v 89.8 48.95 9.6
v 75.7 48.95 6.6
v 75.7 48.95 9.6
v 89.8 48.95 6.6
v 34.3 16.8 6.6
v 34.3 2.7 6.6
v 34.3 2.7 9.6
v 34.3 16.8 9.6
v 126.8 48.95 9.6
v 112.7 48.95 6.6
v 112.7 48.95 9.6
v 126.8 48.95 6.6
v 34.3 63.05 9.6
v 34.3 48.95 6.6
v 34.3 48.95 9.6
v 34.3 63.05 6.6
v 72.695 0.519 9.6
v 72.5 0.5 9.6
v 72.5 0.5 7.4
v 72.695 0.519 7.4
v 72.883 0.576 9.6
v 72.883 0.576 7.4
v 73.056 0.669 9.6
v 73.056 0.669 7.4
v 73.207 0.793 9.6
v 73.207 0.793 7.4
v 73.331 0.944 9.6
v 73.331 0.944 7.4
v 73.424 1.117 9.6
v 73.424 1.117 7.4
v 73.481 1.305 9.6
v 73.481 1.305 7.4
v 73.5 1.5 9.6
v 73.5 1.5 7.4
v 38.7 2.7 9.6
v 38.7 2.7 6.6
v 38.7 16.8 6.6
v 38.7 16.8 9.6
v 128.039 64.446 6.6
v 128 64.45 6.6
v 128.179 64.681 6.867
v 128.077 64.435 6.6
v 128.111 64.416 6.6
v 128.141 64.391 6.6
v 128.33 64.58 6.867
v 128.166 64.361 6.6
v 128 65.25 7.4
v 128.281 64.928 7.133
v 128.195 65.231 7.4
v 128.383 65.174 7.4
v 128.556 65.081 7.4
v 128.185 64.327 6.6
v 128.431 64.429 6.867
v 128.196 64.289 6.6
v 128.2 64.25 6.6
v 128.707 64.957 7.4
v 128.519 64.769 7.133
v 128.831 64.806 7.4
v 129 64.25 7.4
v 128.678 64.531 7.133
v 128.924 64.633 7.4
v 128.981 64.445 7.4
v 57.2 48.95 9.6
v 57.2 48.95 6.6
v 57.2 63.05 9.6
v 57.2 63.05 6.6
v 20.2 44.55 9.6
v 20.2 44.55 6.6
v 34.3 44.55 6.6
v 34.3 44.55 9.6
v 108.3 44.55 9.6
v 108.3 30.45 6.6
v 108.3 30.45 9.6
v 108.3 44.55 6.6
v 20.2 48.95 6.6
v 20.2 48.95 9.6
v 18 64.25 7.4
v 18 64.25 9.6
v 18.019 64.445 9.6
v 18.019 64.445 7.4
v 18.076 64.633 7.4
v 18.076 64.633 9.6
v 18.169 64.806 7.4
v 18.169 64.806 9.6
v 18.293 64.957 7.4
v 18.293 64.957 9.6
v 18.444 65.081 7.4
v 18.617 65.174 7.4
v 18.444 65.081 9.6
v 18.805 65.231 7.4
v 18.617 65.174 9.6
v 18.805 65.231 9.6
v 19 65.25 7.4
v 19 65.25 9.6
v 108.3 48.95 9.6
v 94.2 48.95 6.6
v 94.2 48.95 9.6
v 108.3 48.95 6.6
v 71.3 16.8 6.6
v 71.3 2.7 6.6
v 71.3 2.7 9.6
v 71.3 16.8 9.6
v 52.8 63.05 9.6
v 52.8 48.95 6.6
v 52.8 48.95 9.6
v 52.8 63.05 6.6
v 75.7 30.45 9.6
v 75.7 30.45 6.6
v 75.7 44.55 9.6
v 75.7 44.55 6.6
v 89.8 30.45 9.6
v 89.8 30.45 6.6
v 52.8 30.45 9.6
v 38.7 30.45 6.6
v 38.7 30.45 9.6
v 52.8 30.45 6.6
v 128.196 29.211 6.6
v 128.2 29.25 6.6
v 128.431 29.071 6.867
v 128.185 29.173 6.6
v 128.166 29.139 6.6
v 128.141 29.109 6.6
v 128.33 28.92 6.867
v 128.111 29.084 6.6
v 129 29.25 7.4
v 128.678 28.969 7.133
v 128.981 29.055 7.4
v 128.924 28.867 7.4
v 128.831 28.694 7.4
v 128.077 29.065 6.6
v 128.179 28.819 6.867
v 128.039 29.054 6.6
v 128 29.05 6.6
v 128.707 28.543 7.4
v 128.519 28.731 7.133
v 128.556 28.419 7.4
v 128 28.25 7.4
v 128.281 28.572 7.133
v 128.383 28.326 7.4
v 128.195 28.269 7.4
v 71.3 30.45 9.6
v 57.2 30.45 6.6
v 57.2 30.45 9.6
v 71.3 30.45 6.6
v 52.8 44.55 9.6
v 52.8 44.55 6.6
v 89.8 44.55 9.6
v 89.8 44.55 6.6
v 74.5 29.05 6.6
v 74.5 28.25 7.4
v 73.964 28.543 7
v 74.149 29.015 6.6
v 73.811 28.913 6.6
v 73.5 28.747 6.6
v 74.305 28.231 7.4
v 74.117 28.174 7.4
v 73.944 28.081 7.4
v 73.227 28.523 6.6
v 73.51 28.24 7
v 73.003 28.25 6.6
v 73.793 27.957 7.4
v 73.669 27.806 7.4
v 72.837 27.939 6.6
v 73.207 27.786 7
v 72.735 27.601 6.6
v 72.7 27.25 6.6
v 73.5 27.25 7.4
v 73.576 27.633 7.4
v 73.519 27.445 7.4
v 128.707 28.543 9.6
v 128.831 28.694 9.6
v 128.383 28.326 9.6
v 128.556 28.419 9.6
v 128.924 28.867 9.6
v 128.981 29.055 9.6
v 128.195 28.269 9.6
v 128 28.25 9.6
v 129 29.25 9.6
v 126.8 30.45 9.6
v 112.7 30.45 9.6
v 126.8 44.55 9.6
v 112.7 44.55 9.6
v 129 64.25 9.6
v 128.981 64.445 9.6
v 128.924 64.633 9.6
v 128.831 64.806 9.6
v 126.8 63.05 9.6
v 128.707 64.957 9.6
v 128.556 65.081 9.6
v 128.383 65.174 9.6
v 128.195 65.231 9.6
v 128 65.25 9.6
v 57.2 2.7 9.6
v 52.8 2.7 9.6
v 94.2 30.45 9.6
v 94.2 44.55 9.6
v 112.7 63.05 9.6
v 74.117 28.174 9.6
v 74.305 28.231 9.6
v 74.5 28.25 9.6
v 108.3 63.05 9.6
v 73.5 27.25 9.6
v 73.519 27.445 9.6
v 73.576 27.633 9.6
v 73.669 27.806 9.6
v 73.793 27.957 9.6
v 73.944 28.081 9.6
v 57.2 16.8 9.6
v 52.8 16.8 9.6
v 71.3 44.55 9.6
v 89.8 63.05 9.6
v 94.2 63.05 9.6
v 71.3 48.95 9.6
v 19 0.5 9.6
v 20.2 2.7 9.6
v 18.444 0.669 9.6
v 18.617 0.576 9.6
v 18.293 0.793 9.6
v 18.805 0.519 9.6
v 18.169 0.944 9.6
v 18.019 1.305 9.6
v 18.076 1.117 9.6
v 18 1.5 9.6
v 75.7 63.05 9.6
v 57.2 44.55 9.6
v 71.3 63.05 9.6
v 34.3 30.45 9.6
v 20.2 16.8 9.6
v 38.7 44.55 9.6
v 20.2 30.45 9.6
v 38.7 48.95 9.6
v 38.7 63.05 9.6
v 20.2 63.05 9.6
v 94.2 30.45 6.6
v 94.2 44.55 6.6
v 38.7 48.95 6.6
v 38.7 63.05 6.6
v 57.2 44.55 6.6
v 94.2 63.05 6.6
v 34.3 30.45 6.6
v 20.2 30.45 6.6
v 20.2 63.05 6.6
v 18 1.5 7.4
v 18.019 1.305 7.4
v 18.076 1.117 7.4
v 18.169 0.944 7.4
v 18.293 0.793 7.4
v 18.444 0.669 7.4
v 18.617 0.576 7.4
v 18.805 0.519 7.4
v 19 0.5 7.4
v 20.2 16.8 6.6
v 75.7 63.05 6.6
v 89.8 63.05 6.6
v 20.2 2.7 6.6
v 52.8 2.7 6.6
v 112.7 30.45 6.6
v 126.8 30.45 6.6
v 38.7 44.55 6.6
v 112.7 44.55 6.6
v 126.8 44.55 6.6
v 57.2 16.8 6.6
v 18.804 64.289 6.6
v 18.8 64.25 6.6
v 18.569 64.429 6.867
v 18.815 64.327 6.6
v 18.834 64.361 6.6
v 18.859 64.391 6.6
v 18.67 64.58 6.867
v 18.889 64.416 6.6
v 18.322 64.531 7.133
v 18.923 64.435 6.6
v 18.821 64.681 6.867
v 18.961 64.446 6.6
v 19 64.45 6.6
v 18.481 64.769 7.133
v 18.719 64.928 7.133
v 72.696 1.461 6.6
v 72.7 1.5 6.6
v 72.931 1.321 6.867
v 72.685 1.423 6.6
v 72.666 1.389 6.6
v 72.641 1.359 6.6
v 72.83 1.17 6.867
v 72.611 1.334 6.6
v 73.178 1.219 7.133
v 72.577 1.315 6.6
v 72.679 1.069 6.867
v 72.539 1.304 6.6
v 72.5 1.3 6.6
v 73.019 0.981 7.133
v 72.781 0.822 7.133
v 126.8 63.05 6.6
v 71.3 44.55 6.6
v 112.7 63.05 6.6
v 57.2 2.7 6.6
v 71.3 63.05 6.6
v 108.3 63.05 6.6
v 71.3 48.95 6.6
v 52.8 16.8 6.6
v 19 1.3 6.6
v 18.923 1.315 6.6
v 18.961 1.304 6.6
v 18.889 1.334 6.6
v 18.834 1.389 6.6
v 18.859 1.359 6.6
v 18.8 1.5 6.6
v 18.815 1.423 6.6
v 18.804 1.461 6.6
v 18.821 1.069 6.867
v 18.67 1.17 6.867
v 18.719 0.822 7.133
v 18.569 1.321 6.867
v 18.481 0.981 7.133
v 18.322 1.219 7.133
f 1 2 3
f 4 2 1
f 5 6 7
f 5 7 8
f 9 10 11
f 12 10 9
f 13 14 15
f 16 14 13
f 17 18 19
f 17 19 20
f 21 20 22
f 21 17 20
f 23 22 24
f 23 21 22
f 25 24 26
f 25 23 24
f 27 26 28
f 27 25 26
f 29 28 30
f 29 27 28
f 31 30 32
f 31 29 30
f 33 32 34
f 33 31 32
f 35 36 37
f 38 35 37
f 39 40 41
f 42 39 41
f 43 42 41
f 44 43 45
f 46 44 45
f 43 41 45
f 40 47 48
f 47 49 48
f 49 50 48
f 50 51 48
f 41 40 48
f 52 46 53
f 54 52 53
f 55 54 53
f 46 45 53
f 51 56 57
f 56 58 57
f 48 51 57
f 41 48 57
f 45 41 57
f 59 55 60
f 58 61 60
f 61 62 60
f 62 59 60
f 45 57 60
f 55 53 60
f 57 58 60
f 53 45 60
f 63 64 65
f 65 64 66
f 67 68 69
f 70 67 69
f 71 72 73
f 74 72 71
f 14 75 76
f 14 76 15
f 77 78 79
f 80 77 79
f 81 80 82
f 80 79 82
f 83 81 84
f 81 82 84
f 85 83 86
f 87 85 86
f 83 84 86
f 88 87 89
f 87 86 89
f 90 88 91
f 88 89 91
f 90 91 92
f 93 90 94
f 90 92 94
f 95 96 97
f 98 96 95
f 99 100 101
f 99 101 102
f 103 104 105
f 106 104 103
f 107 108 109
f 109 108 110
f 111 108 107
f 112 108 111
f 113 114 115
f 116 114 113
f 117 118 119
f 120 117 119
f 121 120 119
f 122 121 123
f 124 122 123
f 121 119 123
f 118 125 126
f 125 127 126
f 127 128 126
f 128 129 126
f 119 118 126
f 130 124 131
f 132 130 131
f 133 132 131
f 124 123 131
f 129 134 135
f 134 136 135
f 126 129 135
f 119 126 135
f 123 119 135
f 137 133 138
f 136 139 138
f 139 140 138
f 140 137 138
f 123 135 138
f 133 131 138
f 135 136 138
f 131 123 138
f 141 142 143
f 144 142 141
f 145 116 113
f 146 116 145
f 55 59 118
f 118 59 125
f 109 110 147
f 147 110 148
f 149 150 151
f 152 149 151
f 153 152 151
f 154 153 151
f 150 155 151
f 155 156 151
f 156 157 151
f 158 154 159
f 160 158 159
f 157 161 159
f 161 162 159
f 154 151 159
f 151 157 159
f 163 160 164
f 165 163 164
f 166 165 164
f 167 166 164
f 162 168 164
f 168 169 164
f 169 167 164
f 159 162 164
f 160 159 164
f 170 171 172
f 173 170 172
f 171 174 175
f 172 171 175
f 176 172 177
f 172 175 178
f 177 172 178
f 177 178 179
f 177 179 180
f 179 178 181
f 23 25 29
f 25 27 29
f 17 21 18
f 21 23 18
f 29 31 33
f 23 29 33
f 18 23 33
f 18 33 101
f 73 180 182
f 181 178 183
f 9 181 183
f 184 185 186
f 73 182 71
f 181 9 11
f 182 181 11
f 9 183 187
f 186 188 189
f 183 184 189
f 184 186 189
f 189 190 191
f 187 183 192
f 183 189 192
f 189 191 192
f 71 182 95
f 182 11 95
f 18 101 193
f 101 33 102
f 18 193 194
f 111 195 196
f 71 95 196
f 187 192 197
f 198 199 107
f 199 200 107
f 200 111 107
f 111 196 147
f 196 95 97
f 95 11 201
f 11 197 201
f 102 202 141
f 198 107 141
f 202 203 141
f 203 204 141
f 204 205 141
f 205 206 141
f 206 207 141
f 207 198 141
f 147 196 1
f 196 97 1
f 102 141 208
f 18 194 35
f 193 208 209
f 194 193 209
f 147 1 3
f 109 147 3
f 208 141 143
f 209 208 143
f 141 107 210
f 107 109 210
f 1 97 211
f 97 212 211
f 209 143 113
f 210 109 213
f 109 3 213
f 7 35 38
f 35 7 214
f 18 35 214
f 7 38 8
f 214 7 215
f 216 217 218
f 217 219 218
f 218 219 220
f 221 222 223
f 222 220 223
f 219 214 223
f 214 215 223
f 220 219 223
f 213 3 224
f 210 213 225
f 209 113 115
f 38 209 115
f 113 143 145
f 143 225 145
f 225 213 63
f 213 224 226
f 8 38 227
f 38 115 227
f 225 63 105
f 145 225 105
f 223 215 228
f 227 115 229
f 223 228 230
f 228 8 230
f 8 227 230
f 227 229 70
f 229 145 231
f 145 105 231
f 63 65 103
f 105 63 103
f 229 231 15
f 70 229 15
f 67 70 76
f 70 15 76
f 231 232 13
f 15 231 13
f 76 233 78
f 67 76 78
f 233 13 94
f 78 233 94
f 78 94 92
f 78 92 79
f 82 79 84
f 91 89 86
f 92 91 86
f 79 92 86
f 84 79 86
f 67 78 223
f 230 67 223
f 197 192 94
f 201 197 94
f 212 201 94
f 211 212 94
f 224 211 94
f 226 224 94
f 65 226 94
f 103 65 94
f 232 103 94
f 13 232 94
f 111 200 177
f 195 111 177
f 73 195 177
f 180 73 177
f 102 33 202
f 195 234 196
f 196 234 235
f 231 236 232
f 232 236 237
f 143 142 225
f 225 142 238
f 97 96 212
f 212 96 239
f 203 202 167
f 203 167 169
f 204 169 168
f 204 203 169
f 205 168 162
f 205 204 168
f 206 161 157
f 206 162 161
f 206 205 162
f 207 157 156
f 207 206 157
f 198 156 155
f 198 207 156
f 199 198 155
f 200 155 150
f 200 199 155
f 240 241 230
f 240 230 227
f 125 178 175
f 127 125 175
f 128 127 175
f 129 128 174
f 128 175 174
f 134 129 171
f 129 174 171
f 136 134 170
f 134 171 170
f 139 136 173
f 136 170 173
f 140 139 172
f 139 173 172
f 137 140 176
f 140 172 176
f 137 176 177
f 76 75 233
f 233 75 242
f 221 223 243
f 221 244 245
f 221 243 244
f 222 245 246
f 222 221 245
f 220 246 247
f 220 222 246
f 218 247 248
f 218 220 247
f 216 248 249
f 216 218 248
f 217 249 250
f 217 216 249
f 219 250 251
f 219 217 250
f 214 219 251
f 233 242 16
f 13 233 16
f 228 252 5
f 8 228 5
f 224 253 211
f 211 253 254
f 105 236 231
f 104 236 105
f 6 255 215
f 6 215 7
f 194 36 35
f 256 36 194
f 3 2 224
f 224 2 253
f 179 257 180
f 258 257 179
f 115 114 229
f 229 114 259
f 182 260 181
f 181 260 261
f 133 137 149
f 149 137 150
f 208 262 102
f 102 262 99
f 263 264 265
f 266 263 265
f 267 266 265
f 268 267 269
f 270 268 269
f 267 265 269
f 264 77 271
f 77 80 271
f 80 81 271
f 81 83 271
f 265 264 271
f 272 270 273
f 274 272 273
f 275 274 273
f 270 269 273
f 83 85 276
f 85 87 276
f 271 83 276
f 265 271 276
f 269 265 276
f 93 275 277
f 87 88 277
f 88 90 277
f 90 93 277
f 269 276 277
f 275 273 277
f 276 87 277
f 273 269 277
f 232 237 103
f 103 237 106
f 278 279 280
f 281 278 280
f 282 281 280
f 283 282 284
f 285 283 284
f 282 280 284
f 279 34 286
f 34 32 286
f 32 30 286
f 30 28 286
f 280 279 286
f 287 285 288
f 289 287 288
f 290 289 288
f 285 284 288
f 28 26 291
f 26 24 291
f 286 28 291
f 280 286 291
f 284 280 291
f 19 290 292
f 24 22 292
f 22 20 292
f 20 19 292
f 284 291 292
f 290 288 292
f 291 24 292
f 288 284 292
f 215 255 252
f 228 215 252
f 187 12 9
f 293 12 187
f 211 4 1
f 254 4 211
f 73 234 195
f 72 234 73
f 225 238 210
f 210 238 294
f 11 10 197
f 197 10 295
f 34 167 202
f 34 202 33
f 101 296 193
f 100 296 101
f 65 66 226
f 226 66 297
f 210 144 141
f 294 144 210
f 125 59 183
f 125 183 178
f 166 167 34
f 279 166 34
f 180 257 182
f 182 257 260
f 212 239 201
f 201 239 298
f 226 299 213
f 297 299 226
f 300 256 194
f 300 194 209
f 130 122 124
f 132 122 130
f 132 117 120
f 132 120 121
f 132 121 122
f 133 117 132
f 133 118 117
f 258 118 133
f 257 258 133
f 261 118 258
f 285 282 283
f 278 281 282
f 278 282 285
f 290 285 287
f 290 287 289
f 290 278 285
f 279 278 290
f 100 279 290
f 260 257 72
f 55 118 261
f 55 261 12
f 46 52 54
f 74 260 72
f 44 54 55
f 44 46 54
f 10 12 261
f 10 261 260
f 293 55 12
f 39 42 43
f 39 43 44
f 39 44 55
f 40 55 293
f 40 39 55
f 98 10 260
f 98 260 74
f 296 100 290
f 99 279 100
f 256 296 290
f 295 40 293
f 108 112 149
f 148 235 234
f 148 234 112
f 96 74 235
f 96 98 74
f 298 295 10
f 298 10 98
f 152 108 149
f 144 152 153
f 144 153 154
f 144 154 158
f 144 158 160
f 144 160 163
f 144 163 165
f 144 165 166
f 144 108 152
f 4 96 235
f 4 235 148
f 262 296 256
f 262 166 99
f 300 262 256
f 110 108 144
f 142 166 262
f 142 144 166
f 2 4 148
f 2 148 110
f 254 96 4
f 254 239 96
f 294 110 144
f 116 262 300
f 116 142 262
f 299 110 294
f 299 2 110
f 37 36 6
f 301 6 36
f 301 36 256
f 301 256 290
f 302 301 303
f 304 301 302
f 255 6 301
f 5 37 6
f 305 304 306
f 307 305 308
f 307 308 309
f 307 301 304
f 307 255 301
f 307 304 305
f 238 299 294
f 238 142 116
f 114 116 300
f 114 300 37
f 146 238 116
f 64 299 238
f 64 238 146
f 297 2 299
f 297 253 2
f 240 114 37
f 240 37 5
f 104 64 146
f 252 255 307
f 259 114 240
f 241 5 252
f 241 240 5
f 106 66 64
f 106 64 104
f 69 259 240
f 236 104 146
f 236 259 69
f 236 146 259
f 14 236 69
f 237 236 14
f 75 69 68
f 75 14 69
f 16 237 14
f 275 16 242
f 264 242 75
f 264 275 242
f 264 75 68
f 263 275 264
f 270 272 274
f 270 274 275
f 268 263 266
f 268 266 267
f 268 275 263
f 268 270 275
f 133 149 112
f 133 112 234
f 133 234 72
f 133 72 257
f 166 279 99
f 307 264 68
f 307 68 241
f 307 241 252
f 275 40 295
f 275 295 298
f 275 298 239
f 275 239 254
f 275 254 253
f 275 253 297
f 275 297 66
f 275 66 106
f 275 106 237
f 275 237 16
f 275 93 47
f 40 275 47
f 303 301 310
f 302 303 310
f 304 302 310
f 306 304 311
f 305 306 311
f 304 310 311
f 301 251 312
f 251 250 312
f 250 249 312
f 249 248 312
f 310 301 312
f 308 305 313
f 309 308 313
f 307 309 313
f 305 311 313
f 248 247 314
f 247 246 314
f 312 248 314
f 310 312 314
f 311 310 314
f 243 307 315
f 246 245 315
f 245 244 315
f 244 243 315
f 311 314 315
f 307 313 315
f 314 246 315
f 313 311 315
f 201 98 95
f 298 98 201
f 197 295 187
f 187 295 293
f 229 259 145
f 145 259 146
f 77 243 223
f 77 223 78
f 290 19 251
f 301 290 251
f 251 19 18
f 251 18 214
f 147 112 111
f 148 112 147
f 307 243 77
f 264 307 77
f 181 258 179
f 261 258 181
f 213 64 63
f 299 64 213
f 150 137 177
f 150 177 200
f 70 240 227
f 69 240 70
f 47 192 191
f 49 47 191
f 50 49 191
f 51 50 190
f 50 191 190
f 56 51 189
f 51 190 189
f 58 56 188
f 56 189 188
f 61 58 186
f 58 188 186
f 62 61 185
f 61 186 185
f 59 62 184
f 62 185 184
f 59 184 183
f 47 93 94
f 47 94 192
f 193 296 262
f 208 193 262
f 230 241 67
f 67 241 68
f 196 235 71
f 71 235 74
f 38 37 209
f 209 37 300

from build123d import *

# Parameters (mm, degrees)
SKETCH006_W     = 14.1
SKETCH006_H     = 14.1
PAD003_DEPTH    = 3
FILLET_R        = 1
CHAMFER001_SIZE = 0.8


with BuildPart() as part:
    # Sketch006 → Pad003 (new body)
    with BuildSketch(Plane.XY):
        Polygon((0, 0), (0, 64.75), (111, 64.75), (111, 27.75), (55.5, 27.75), (55.5, 0), align=None)
        with Locations((27.75, 9.25)):
            Rectangle(SKETCH006_W, SKETCH006_H, mode=Mode.SUBTRACT)
        with Locations((27.75, 55.5)):
            Rectangle(SKETCH006_W, SKETCH006_H, mode=Mode.SUBTRACT)
        with Locations((27.75, 37)):
            Rectangle(SKETCH006_W, SKETCH006_H, mode=Mode.SUBTRACT)
        with Locations((46.25, 55.5)):
            Rectangle(SKETCH006_W, SKETCH006_H, mode=Mode.SUBTRACT)
        with Locations((64.75, 55.5)):
            Rectangle(SKETCH006_W, SKETCH006_H, mode=Mode.SUBTRACT)
        with Locations((83.25, 55.5)):
            Rectangle(SKETCH006_W, SKETCH006_H, mode=Mode.SUBTRACT)
        with Locations((101.75, 55.5)):
            Rectangle(SKETCH006_W, SKETCH006_H, mode=Mode.SUBTRACT)
        with Locations((101.75, 37)):
            Rectangle(SKETCH006_W, SKETCH006_H, mode=Mode.SUBTRACT)
        with Locations((83.25, 37)):
            Rectangle(SKETCH006_W, SKETCH006_H, mode=Mode.SUBTRACT)
        with Locations((64.75, 37)):
            Rectangle(SKETCH006_W, SKETCH006_H, mode=Mode.SUBTRACT)
        with Locations((46.25, 37)):
            Rectangle(SKETCH006_W, SKETCH006_H, mode=Mode.SUBTRACT)
        with Locations((9.25, 55.5)):
            Rectangle(SKETCH006_W, SKETCH006_H, mode=Mode.SUBTRACT)
        with Locations((9.25, 37)):
            Rectangle(SKETCH006_W, SKETCH006_H, mode=Mode.SUBTRACT)
        with Locations((9.25, 9.25)):
            Rectangle(SKETCH006_W, SKETCH006_H, mode=Mode.SUBTRACT)
        with Locations((46.25, 9.25)):
            Rectangle(SKETCH006_W, SKETCH006_H, mode=Mode.SUBTRACT)
    extrude(amount=PAD003_DEPTH)

    # Fillet
    fillet_edges = [part.edges().sort_by_distance(p)[0] for p in [
        (55.5, 0, 1.5),
        (55.5, 27.75, 1.5),
        (111, 27.75, 1.5),
        (0, 0, 1.5),
        (0, 64.75, 1.5),
        (111, 64.75, 1.5),
    ]]
    fillet(fillet_edges, radius=FILLET_R)

    # Chamfer001
    chamfer001_edges = [part.edges().sort_by_distance(p)[0] for p in [
        (83.25, 27.75, 0),
    ]]
    chamfer(chamfer001_edges, length=CHAMFER001_SIZE)


with BuildPart() as part_1:
    # Body002 placement: moved
    add(part.part.moved(Location((18, 0.5, 6.6))))


solid = part_1.part
